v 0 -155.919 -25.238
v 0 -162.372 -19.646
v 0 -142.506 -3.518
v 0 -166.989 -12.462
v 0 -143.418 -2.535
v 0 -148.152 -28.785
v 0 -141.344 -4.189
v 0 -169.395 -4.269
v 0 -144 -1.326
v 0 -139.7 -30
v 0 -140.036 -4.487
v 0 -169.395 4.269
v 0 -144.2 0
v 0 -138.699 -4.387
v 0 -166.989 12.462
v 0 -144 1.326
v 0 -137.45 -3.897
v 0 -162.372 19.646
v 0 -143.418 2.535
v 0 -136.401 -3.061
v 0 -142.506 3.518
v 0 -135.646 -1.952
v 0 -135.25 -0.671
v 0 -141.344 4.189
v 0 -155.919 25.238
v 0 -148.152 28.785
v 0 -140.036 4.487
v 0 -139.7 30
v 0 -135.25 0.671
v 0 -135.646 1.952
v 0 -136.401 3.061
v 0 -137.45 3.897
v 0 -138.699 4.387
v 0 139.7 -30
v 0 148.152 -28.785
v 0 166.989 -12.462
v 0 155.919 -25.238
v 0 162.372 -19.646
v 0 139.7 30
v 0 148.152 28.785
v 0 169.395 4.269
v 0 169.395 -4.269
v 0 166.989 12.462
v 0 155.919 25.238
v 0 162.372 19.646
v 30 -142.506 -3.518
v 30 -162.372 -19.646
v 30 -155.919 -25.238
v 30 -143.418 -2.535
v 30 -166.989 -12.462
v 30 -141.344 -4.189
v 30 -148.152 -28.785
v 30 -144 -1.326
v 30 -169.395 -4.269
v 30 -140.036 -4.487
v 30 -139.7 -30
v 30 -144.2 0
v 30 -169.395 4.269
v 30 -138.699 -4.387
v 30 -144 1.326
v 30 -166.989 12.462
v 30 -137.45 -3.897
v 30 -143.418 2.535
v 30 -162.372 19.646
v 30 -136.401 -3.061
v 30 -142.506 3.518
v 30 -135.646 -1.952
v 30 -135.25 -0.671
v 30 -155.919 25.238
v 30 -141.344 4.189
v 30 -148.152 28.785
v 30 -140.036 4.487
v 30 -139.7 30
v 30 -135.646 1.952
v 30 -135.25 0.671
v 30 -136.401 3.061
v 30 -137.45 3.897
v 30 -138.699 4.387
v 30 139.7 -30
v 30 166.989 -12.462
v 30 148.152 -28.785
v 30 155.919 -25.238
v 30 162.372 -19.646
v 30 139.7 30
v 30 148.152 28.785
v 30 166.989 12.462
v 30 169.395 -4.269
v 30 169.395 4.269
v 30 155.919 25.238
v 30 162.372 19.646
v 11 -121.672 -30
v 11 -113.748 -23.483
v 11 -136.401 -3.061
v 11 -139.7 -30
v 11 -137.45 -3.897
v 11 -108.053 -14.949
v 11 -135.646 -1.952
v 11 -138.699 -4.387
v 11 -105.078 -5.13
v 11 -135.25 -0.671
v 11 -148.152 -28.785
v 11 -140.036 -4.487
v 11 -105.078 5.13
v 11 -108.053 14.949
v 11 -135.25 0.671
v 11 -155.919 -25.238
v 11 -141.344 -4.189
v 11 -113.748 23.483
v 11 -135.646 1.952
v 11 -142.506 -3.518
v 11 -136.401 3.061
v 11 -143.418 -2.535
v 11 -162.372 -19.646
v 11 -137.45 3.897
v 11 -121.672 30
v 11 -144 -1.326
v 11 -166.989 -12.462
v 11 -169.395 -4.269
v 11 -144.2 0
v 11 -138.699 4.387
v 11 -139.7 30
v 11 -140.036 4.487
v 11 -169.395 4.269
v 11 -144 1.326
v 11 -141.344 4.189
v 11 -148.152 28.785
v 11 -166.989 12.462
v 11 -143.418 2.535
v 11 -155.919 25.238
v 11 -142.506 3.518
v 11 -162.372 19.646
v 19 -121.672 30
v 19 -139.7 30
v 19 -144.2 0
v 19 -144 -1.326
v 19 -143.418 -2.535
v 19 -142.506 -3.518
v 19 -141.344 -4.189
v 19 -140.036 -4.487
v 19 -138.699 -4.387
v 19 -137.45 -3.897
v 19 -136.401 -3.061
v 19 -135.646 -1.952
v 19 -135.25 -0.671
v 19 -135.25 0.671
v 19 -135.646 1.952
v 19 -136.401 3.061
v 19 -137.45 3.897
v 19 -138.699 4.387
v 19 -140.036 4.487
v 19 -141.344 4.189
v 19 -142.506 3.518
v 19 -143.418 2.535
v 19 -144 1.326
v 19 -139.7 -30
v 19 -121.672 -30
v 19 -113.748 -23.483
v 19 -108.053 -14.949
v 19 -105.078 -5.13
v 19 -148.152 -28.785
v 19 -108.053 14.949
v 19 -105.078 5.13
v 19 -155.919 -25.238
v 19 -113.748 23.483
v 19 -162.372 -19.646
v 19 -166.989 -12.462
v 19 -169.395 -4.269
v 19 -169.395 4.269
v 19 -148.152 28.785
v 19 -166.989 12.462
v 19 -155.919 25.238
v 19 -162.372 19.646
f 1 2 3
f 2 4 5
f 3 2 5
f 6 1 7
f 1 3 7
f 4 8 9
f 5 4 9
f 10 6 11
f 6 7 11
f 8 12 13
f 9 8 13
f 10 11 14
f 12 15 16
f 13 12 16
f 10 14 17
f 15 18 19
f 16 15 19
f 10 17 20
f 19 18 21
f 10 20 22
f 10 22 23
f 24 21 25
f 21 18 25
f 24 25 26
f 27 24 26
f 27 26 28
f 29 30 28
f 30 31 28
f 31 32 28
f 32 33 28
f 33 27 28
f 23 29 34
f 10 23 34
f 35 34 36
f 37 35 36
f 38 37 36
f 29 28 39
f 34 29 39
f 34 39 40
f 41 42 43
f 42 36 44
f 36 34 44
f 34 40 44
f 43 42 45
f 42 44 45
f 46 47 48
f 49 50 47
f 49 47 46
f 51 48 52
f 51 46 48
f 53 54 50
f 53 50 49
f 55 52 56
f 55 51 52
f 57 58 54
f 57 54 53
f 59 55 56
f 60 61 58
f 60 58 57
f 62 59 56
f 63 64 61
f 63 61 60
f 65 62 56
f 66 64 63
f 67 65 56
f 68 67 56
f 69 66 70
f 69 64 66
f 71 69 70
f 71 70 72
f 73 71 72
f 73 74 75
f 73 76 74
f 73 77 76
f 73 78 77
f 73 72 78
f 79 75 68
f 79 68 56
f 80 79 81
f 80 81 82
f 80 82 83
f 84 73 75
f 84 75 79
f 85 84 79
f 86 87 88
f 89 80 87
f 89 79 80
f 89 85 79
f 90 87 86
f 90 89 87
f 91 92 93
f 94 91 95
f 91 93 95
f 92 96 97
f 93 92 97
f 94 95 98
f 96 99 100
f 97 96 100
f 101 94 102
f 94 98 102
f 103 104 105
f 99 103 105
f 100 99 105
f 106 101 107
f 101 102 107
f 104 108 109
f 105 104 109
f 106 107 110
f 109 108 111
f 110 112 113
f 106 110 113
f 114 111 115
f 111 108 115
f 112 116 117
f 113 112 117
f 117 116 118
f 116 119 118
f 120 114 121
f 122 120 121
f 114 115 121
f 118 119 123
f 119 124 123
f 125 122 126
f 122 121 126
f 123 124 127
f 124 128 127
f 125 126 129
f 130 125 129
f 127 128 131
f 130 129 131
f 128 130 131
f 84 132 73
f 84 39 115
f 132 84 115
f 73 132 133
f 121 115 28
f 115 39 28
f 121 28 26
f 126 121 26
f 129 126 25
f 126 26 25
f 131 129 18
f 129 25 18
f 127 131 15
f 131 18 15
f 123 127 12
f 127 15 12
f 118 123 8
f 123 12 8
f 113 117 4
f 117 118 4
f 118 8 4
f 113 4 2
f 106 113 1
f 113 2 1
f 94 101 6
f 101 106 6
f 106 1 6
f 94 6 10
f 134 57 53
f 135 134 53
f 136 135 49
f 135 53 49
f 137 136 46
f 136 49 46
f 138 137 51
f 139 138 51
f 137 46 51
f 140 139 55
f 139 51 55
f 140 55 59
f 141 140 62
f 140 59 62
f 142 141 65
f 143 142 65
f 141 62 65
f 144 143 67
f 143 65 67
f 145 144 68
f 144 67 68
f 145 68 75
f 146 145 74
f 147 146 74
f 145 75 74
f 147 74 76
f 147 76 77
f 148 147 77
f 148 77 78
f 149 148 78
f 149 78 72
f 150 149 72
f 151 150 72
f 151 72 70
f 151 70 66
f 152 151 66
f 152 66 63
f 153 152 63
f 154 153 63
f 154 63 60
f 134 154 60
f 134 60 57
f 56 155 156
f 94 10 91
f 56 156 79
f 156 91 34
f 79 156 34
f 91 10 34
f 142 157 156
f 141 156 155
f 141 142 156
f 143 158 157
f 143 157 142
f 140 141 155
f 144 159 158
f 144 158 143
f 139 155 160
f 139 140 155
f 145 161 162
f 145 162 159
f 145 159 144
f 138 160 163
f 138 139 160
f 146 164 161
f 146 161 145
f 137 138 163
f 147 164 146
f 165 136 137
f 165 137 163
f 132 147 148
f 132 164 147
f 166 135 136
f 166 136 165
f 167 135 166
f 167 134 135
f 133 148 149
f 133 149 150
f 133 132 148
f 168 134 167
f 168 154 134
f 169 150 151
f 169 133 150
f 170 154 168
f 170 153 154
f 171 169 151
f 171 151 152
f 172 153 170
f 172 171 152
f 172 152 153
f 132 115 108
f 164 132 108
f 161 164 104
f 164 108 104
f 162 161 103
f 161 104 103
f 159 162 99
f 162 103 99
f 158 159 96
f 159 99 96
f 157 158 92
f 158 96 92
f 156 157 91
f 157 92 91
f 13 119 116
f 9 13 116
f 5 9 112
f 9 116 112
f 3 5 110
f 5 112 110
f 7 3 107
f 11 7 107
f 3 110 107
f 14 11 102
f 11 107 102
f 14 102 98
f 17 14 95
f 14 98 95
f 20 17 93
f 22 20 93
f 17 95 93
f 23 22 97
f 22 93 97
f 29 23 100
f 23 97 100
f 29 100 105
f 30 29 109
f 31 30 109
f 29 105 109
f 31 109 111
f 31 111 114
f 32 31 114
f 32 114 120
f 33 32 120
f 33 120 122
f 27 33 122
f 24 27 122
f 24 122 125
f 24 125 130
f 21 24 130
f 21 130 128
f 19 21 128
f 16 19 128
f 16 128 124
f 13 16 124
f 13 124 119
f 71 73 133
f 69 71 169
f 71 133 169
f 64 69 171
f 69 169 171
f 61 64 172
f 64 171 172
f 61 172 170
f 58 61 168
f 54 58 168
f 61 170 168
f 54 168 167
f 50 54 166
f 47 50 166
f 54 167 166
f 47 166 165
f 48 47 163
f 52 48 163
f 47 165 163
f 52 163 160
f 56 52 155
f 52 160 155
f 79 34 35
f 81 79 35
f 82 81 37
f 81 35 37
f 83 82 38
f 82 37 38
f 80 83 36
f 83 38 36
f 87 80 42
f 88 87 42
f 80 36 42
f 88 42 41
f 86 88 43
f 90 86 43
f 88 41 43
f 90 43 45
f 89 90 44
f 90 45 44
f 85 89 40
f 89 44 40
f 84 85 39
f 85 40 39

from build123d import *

# Parameters (mm, degrees)
F1_DEPTH = 30
F3_R     = 35
F4_DEPTH = 4
F5_D     = 9


with BuildPart() as f1:
    # F0 (on Right) → F1 (new body)
    with BuildSketch(Plane.YZ):
        with BuildLine():
            ThreePointArc((139.7, -30), (169.7, 0), (139.7, 30))
            Line((139.7, 30), (-139.7, 30))
            ThreePointArc((-139.7, 30), (-169.7, 0), (-139.7, -30))
            Line((-139.7, -30), (139.7, -30))
        make_face()
    extrude(amount=F1_DEPTH)

    # F3 (on mid) → F4 (cut, symmetric)
    with BuildSketch(Plane(origin=(15, 0, 0), x_dir=(0, -1, 0), z_dir=(-1, 0, 0))):
        with Locations((139.7, 0)):
            Circle(F3_R)
    extrude(amount=F4_DEPTH, both=True, mode=Mode.SUBTRACT)

    # F5 (through all)
    with Locations(Plane(origin=(0, 0, 0), x_dir=(0, 1, 0), z_dir=(-1, 0, 0))):
        with Locations((-139.7, 0)):
            Hole(F5_D / 2)


solid = f1.part
